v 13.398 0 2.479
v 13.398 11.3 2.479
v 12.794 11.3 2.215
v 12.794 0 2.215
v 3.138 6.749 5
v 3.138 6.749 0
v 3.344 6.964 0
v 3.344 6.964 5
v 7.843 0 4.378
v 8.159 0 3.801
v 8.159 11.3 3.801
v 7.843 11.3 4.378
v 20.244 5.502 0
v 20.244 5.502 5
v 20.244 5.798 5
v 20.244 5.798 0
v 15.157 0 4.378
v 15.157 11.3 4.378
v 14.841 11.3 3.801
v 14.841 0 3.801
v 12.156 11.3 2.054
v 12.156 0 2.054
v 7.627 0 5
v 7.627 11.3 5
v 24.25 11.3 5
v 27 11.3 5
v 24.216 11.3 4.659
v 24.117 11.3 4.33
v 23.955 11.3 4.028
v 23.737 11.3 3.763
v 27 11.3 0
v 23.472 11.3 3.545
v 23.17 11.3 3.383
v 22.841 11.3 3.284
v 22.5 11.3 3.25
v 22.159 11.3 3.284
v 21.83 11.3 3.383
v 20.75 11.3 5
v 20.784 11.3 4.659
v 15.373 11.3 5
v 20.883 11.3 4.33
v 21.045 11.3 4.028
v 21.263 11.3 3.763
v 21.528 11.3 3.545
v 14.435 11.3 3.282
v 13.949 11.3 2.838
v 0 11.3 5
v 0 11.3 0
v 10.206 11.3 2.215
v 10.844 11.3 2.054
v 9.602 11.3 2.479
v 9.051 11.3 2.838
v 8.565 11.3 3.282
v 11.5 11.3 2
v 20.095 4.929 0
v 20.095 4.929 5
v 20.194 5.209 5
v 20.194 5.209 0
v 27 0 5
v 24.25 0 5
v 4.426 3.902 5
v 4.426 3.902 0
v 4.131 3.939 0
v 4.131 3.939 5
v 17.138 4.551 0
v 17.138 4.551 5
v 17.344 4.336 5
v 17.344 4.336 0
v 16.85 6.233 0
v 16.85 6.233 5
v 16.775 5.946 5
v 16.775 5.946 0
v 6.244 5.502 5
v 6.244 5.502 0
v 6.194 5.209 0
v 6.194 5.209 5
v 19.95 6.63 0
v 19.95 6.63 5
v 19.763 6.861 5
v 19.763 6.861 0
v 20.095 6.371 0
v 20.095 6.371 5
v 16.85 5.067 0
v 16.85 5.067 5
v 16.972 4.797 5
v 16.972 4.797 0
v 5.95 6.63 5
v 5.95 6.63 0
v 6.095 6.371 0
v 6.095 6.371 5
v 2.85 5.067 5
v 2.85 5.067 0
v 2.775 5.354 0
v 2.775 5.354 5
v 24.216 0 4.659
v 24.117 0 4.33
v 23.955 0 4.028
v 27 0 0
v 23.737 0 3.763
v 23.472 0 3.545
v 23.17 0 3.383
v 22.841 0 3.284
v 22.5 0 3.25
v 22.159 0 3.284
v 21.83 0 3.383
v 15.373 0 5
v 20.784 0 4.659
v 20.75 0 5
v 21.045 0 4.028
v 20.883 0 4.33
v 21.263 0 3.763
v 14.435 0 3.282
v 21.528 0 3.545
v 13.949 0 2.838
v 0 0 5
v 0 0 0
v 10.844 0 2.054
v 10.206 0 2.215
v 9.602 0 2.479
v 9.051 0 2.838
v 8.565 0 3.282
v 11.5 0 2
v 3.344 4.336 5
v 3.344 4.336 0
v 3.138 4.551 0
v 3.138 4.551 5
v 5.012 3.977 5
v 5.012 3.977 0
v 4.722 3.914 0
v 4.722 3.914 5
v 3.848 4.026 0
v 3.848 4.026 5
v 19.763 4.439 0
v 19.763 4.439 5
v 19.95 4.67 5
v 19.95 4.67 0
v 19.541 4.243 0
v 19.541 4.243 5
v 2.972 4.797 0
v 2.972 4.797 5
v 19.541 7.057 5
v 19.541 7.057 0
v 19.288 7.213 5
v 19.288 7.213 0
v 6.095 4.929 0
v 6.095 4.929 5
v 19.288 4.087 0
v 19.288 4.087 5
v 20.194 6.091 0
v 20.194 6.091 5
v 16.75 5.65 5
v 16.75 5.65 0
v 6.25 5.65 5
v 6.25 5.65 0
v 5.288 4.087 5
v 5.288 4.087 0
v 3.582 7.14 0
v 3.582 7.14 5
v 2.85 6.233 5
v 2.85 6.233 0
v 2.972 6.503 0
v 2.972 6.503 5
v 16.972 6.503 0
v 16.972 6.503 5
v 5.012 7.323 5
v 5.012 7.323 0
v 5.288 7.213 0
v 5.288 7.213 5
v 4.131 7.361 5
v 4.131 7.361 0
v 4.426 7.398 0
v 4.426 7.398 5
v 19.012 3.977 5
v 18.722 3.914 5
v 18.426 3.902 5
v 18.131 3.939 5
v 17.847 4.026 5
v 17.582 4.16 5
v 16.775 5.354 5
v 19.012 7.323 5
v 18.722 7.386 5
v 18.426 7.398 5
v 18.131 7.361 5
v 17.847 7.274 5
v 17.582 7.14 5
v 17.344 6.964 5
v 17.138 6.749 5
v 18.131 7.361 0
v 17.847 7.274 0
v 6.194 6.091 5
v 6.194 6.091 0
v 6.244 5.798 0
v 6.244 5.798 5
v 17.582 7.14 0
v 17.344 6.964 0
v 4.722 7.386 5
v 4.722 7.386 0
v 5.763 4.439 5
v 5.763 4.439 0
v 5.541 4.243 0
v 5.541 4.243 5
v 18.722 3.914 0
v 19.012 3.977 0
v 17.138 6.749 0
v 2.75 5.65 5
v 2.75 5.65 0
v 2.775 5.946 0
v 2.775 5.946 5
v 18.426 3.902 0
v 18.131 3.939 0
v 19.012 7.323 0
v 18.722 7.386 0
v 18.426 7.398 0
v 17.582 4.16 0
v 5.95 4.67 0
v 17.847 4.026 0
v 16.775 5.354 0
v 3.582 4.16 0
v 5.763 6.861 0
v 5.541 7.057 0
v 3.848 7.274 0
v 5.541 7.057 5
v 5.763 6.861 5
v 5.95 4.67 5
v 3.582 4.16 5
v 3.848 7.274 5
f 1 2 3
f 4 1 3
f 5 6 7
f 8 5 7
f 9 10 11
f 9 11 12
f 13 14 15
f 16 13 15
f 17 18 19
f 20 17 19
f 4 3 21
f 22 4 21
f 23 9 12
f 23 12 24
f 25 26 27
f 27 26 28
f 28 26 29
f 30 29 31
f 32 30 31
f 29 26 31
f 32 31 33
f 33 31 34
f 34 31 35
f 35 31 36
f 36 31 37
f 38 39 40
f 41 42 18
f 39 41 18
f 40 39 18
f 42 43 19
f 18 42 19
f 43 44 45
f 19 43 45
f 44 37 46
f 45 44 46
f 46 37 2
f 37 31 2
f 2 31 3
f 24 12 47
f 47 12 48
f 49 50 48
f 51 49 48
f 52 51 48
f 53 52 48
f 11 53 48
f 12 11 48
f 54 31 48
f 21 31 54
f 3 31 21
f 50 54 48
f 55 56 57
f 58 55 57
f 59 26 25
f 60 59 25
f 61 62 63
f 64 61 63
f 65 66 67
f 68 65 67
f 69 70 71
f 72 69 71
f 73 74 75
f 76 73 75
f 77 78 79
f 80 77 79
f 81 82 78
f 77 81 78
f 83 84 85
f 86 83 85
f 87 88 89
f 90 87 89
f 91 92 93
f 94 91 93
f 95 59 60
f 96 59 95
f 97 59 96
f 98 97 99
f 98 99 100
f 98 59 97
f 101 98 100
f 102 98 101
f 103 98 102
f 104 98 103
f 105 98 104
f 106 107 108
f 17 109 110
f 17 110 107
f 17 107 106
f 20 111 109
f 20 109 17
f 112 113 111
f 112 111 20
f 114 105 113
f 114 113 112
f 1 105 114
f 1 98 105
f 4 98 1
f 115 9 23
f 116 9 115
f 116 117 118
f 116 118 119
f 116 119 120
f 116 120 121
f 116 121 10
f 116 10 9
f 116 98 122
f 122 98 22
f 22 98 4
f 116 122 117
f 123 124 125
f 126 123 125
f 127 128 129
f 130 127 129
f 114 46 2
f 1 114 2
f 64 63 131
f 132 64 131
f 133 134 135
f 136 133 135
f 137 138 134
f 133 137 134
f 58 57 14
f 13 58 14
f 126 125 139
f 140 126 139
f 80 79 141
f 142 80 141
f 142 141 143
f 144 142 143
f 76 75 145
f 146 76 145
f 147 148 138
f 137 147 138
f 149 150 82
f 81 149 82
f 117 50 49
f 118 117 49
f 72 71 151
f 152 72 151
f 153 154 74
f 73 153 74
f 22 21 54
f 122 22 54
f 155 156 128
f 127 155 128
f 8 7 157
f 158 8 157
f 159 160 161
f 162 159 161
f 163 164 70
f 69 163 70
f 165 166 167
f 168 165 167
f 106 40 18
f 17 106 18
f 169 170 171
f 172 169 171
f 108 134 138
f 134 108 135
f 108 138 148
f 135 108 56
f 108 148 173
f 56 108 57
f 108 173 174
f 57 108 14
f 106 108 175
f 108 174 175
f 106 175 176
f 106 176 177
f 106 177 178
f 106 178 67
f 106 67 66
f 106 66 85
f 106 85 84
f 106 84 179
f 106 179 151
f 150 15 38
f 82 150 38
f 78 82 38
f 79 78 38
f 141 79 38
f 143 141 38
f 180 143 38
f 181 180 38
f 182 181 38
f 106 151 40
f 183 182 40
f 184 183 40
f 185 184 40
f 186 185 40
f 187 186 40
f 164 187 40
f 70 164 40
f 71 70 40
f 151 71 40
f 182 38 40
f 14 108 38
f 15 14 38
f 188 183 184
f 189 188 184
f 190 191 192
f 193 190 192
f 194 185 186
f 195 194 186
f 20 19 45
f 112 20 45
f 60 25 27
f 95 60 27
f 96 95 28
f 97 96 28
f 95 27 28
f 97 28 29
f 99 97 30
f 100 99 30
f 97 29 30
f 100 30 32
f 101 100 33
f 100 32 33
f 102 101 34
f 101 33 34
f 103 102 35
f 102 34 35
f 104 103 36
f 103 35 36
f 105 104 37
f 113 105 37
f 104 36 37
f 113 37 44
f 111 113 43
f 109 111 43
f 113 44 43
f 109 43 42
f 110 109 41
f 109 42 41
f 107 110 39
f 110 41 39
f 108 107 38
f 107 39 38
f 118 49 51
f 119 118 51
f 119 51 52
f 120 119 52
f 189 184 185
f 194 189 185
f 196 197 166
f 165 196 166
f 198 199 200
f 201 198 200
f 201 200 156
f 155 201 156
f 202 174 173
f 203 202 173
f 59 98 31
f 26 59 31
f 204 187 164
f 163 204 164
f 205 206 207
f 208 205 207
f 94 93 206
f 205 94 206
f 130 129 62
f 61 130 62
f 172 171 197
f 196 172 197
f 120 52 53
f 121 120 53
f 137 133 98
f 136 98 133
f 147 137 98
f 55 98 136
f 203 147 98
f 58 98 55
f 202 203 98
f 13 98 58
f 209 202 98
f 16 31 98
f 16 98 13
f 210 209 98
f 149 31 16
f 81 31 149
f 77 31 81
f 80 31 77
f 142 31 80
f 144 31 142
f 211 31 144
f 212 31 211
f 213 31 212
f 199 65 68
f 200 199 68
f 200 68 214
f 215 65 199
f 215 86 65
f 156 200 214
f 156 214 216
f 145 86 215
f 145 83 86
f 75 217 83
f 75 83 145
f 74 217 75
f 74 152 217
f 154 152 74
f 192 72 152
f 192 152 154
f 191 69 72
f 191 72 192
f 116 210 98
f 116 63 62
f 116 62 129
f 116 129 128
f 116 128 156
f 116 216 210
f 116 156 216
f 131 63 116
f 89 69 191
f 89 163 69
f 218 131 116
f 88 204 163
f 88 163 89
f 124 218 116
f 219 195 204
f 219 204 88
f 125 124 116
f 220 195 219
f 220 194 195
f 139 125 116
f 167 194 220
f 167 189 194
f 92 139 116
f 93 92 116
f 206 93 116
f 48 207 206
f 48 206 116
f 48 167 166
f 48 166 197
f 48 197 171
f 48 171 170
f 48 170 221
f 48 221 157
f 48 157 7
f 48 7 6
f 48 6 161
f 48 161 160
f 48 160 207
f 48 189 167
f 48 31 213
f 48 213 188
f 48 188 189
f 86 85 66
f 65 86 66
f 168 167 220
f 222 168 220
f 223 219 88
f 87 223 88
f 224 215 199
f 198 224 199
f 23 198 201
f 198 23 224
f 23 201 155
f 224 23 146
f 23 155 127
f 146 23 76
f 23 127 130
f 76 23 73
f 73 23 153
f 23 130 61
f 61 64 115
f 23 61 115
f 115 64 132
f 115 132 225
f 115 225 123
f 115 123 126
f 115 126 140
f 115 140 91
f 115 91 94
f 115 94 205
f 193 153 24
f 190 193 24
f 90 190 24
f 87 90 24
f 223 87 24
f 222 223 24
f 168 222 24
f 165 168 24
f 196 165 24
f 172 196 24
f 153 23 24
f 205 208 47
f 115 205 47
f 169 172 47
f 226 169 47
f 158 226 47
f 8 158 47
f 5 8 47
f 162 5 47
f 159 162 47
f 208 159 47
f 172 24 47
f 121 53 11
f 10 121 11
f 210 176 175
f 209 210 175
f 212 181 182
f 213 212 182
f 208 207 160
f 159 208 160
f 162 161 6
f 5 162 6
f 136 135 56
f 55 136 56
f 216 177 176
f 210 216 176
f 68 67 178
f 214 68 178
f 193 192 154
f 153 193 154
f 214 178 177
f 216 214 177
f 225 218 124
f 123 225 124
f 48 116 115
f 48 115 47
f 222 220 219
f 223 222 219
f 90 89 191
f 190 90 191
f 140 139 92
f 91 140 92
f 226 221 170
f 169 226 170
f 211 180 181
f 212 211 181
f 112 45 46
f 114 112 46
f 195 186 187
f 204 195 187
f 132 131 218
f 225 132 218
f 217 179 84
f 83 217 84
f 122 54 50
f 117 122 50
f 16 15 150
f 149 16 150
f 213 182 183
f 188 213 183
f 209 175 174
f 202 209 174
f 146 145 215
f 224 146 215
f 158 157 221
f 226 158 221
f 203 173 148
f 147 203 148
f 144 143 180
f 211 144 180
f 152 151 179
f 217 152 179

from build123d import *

# Parameters (mm, degrees)
ESQUISSE1_W             = 27
ESQUISSE1_H             = 11.300000191
BOSS_EXTRU_1_DEPTH      = 5
ENL_V_MAT_EXTRU_1_DEPTH = 30.693265302
ENL_V_MAT_EXTRU_2_DEPTH = 30.693265302
ENL_V_MAT_EXTRU_3_DEPTH = 30.693265302
ENL_V_MAT_EXTRU_4_DEPTH = 30.693265302
D_POUILLE1_ANGLE        = 19.197649098
D_POUILLE2_ANGLE        = 19.197649098


with BuildPart() as part:
    # Esquisse1 → Boss.-Extru.1 (new body)
    with BuildSketch(Plane(origin=(0, 0, 0), x_dir=(-1, 0, 0), z_dir=(0, 0, -1))):
        with Locations((-13.5, 5.650000096)):
            Rectangle(ESQUISSE1_W, ESQUISSE1_H)
    extrude(amount=-BOSS_EXTRU_1_DEPTH)

    # Esquisse2 → Enlèv. mat.-Extru.1 (cut, through all)
    with BuildSketch(Plane(origin=(0, 11.300000191, 0), x_dir=(-1, 0, 0), z_dir=(0, 1, 0))):
        Polygon((-15.372982979, 5), (-15.372982979, 4.774707955), (-14.840999603, 3.800517559), (-14.434993744, 3.282314301), (-13.949490547, 2.83772254), (-13.397639275, 2.478783607), (-12.794389725, 2.21522069), (-12.156080246, 2.054171801), (-11.5, 2), (-10.843919754, 2.054171801), (-10.205610275, 2.21522069), (-9.602360725, 2.478783607), (-9.050509453, 2.83772254), (-8.56500721, 3.282314301), (-8.159000397, 3.800517559), (-7.627017021, 4.774707955), (-7.627017021, 5), align=None)
    extrude(amount=-ENL_V_MAT_EXTRU_1_DEPTH, mode=Mode.SUBTRACT)

    # Esquisse3 → Enlèv. mat.-Extru.2 (cut, through all)
    with BuildSketch(Plane(origin=(0, 11.300000191, 0), x_dir=(-1, 0, 0), z_dir=(0, 1, 0))):
        with BuildLine():
            Line((-20.75, 5), (-24.25, 5))
            ThreePointArc((-24.25, 5), (-22.5, 3.25), (-20.75, 5))
        make_face()
    extrude(amount=-ENL_V_MAT_EXTRU_2_DEPTH, mode=Mode.SUBTRACT)

    # Esquisse4 → Enlèv. mat.-Extru.3 (cut, through all)
    with BuildSketch(Plane(origin=(0, 0, 0), x_dir=(-1, 0, 0), z_dir=(0, 0, -1))):
        Polygon((-2.75, 5.650000095), (-2.775172234, 5.945751667), (-2.84996438, 6.232994556), (-2.972225189, 6.503466129), (-3.13843751, 6.74938488), (-3.343819141, 6.963676453), (-3.582462311, 7.140175819), (-3.847501278, 7.273805618), (-4.13131094, 7.360721588), (-4.425727844, 7.398423195), (-4.722281456, 7.385825634), (-5.012440205, 7.323291779), (-5.287856102, 7.212620258), (-5.540607929, 7.056994915), (-5.763422966, 6.86089325), (-5.949892044, 6.629955769), (-6.094649792, 6.370827198), (-6.193532467, 6.090961456), (-6.243695736, 5.798409939), (-6.25, 5.650000095), (-6.243695736, 5.501589775), (-6.193532467, 5.209038734), (-6.094649792, 4.929172993), (-5.949892044, 4.670043945), (-5.763422966, 4.439106941), (-5.540607929, 4.243005276), (-5.287856102, 4.087379456), (-5.012440205, 3.976708174), (-4.722281456, 3.91417408), (-4.425727844, 3.901576757), (-4.13131094, 3.939278364), (-3.847501278, 4.026194096), (-3.582462311, 4.159823895), (-3.343819141, 4.336323738), (-3.13843751, 4.550614834), (-2.972225189, 4.796534061), (-2.84996438, 5.067005157), (-2.775172234, 5.354248524), align=None)
    extrude(amount=-ENL_V_MAT_EXTRU_3_DEPTH, mode=Mode.SUBTRACT)

    # Esquisse5 → Enlèv. mat.-Extru.4 (cut, through all)
    with BuildSketch(Plane.XY.offset(5)):
        Polygon((16.77517128, 5.354248524), (16.849964142, 5.067005157), (16.972225189, 4.796534061), (17.138439178, 4.550614834), (17.343818665, 4.336323738), (17.582462311, 4.159823895), (17.847499847, 4.026194096), (18.131311417, 3.939278364), (18.425727844, 3.901576757), (18.722280502, 3.91417408), (19.012439728, 3.976708174), (19.287857056, 4.087379456), (19.540607452, 4.243005276), (19.76342392, 4.439106941), (19.949892044, 4.670043945), (20.094650269, 4.929172993), (20.193532944, 5.209038734), (20.243694305, 5.501589775), (20.243694305, 5.798409939), (20.193532944, 6.090961456), (20.094650269, 6.370827198), (19.949892044, 6.629955769), (19.76342392, 6.86089325), (19.540607452, 7.056994915), (19.287857056, 7.212620258), (19.012439728, 7.323291779), (18.722280502, 7.385825634), (18.425727844, 7.398423195), (18.131311417, 7.360721588), (17.847499847, 7.273805618), (17.582462311, 7.140175819), (17.343818665, 6.963676453), (17.138439178, 6.74938488), (16.972225189, 6.503466129), (16.849964142, 6.232994556), (16.77517128, 5.945751667), (16.75, 5.650000095), align=None)
    extrude(amount=-ENL_V_MAT_EXTRU_4_DEPTH, mode=Mode.SUBTRACT)

    # Dépouille1
    d_pouille1_faces = [part.faces().sort_by_distance(p)[0] for p in [
        (7.627017021, 5.650000095, 4.887353977),
    ]]
    draft(d_pouille1_faces, Plane.XY.offset(5), D_POUILLE1_ANGLE)

    # Dépouille2
    d_pouille2_faces = [part.faces().sort_by_distance(p)[0] for p in [
        (15.372982979, 5.650000095, 4.887353977),
    ]]
    draft(d_pouille2_faces, Plane.XY.offset(5), D_POUILLE2_ANGLE)


solid = part.part
